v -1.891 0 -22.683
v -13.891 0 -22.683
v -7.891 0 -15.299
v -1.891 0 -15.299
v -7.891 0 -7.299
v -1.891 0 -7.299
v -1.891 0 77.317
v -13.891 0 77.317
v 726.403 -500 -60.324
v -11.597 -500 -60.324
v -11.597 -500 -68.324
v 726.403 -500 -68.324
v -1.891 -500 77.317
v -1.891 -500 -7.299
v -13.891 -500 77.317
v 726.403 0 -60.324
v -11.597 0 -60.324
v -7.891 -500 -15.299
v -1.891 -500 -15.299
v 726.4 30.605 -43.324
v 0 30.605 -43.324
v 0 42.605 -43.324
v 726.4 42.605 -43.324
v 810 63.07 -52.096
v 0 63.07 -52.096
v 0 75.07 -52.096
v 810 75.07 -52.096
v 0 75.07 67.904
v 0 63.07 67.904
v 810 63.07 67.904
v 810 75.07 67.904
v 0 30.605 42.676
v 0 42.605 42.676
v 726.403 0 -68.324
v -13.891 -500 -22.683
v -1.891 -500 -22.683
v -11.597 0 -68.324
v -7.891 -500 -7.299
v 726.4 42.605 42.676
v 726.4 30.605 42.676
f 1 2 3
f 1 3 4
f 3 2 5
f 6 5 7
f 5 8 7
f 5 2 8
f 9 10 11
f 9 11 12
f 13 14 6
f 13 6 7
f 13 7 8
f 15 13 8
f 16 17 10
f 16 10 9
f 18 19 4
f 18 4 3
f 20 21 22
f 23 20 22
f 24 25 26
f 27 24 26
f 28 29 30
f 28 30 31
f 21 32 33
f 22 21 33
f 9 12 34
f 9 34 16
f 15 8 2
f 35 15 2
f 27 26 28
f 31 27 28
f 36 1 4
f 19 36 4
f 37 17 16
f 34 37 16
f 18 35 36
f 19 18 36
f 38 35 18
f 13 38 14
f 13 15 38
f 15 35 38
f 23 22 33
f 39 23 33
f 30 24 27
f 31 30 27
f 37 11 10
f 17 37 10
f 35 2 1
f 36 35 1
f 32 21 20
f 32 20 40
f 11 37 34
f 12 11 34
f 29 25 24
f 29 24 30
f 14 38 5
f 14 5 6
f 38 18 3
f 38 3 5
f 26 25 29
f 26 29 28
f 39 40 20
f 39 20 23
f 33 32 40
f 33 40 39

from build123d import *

# Parameters (mm, degrees)
F1_DEPTH = 500
F2_W     = 738
F2_H     = 8
F3_DEPTH = 500
F4_W     = 12
F4_H     = 86
F5_DEPTH = 726.4
F6_W     = 12
F6_H     = 120
F7_DEPTH = 810


# Not quite as in the source:
# - a feature names something its author has since deleted; it is built from what else it names


with BuildPart() as f1:
    # F0 (on Front) → F1 (new body)
    with BuildSketch(Plane.XZ):
        Polygon((-1.8907085117, 77.3167183763), (-13.8907085117, 77.3167183763), (-13.8907085117, -22.6832816237), (-1.8907085117, -22.6832816237), (-1.8907085117, -15.298666623), (-7.8907085117, -15.298666623), (-7.8907085117, -7.298666623), (-1.8907085117, -7.298666623), align=None)
    extrude(amount=F1_DEPTH)


with BuildPart() as f3:
    # F2 (on Front) → F3 (new body)
    with BuildSketch(Plane.XZ):
        with Locations((357.4027951019, -64.3239161)):
            Rectangle(F2_W, F2_H)
    extrude(amount=F3_DEPTH)


with BuildPart() as f5:
    # F4 (on Right) → F5 (new body)
    with BuildSketch(Plane.YZ):
        with Locations((36.6045031697, -0.3242592409)):
            Rectangle(F4_W, F4_H)
    extrude(amount=F5_DEPTH)


with BuildPart() as f7:
    # F6 (on Right) → F7 (new body)
    with BuildSketch(Plane.YZ):
        with Locations((69.0702423453, 7.9040200152)):
            Rectangle(F6_W, F6_H)
    extrude(amount=F7_DEPTH)


solid = Compound([f1.part, f3.part, f5.part, f7.part])
